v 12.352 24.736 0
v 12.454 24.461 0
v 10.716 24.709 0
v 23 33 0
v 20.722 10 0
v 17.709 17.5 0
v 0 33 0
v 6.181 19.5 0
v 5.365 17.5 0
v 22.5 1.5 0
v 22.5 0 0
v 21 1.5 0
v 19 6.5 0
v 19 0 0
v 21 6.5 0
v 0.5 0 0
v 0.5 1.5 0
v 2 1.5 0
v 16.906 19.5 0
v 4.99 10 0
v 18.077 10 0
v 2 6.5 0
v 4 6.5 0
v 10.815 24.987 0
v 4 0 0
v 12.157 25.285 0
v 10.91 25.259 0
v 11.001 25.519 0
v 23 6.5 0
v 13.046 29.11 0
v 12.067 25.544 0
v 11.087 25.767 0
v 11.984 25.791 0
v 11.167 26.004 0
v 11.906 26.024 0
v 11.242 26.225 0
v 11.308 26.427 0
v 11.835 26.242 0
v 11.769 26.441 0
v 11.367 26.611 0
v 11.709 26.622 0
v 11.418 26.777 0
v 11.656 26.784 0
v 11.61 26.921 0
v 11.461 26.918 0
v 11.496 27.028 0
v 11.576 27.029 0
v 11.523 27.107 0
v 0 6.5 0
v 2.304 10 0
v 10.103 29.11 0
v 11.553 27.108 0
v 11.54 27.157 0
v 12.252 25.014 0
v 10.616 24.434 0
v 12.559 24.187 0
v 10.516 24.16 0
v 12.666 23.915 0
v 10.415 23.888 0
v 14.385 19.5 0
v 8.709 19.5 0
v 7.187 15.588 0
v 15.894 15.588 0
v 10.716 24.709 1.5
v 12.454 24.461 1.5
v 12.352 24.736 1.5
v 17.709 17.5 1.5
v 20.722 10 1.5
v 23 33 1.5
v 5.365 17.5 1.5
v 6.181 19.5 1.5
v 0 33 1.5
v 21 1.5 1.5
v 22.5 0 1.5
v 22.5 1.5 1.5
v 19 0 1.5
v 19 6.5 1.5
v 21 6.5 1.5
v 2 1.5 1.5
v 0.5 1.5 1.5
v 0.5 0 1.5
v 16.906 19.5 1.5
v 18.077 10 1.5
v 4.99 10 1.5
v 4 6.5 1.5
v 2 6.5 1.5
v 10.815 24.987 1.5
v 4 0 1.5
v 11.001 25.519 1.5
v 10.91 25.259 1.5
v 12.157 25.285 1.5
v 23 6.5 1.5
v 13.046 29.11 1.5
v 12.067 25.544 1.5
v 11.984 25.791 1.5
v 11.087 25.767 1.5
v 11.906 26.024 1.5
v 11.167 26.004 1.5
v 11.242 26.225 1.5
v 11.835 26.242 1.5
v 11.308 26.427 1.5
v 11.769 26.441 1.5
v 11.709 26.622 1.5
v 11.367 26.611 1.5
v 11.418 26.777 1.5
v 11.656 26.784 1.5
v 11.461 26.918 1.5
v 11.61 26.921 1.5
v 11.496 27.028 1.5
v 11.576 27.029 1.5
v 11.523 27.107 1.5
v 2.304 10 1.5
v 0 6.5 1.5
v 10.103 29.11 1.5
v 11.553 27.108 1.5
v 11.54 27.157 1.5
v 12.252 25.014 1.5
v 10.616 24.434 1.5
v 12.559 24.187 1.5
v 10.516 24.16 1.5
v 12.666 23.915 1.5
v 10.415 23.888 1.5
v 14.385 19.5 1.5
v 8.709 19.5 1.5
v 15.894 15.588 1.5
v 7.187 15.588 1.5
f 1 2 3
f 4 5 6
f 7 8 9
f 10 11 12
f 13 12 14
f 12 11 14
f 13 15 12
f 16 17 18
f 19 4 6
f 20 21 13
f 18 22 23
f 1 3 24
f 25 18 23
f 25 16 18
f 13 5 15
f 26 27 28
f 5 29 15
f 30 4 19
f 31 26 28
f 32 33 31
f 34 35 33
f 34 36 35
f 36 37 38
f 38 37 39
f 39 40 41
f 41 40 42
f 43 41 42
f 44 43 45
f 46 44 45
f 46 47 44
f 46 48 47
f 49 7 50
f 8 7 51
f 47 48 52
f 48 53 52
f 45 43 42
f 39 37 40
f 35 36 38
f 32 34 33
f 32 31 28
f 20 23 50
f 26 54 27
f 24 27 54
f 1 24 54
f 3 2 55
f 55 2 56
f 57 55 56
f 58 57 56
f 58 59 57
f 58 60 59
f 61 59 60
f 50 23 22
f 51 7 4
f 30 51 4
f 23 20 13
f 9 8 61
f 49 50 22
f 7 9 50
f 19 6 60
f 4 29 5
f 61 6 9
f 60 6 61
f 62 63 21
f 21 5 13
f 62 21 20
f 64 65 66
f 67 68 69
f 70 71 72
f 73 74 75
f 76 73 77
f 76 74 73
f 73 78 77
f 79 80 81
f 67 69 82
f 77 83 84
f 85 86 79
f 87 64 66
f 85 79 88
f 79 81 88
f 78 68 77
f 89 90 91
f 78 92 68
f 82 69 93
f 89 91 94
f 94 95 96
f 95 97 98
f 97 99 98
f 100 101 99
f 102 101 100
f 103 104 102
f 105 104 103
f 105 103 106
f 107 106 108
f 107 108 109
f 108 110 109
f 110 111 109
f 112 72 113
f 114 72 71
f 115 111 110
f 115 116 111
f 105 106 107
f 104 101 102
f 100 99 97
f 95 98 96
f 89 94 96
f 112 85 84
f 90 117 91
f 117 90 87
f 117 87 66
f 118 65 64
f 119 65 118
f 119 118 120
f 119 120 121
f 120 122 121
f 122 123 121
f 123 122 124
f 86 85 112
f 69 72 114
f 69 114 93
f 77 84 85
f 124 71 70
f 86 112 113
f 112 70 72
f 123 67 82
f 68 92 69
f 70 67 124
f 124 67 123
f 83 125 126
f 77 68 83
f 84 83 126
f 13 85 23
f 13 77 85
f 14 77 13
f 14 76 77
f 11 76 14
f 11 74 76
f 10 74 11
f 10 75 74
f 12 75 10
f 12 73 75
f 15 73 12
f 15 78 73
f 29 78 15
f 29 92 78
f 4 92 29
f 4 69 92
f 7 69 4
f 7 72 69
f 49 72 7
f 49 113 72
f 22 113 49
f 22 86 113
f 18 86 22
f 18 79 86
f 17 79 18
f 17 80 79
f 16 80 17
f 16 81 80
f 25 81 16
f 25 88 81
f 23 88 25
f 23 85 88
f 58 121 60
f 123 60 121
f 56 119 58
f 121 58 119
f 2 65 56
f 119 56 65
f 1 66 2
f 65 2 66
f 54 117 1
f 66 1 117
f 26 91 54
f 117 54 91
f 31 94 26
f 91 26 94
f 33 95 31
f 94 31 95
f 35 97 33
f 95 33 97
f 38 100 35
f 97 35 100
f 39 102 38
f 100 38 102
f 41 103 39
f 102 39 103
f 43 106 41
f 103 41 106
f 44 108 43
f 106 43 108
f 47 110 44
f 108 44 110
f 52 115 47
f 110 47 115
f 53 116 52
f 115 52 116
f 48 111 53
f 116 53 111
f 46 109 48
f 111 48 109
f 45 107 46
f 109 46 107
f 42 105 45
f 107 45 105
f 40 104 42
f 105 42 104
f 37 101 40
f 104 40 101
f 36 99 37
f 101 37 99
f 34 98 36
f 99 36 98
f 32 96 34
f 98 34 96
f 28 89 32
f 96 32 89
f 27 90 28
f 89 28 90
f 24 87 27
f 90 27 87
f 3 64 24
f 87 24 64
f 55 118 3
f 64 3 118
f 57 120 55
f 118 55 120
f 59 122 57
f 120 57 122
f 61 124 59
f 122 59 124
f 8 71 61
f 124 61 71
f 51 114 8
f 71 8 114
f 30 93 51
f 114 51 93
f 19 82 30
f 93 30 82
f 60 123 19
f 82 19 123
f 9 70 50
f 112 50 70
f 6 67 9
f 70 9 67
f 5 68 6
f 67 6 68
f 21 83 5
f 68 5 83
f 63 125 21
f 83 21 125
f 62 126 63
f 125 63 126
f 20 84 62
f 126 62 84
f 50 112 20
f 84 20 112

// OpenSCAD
// file: _action_card_module.scad
module 2d_action_card(letter, letter_offset) {
    width=23;
    height=33;
    difference() {
            square([width, height]);
            translate([-1, 1.5, 0]) square([3, 5]);
            translate([-1, -1, 0]) square([1.5, 4]);
            translate([4, -1.5, 0]) square([width-8, 8]);
            translate([width-2, 1.5, 0]) square([3, 5]);
            translate([width-0.5, -1, 0]) square([2, 4]);
            translate([letter_offset, 10, 0]) text(letter, 20);
        }
}
// main file
include <_action_card_module.scad>;

linear_extrude(1.5) {
    union() {
        2d_action_card("A", 2.25);
        translate([0,17.5,0]) square([20,2]);
    }
}
